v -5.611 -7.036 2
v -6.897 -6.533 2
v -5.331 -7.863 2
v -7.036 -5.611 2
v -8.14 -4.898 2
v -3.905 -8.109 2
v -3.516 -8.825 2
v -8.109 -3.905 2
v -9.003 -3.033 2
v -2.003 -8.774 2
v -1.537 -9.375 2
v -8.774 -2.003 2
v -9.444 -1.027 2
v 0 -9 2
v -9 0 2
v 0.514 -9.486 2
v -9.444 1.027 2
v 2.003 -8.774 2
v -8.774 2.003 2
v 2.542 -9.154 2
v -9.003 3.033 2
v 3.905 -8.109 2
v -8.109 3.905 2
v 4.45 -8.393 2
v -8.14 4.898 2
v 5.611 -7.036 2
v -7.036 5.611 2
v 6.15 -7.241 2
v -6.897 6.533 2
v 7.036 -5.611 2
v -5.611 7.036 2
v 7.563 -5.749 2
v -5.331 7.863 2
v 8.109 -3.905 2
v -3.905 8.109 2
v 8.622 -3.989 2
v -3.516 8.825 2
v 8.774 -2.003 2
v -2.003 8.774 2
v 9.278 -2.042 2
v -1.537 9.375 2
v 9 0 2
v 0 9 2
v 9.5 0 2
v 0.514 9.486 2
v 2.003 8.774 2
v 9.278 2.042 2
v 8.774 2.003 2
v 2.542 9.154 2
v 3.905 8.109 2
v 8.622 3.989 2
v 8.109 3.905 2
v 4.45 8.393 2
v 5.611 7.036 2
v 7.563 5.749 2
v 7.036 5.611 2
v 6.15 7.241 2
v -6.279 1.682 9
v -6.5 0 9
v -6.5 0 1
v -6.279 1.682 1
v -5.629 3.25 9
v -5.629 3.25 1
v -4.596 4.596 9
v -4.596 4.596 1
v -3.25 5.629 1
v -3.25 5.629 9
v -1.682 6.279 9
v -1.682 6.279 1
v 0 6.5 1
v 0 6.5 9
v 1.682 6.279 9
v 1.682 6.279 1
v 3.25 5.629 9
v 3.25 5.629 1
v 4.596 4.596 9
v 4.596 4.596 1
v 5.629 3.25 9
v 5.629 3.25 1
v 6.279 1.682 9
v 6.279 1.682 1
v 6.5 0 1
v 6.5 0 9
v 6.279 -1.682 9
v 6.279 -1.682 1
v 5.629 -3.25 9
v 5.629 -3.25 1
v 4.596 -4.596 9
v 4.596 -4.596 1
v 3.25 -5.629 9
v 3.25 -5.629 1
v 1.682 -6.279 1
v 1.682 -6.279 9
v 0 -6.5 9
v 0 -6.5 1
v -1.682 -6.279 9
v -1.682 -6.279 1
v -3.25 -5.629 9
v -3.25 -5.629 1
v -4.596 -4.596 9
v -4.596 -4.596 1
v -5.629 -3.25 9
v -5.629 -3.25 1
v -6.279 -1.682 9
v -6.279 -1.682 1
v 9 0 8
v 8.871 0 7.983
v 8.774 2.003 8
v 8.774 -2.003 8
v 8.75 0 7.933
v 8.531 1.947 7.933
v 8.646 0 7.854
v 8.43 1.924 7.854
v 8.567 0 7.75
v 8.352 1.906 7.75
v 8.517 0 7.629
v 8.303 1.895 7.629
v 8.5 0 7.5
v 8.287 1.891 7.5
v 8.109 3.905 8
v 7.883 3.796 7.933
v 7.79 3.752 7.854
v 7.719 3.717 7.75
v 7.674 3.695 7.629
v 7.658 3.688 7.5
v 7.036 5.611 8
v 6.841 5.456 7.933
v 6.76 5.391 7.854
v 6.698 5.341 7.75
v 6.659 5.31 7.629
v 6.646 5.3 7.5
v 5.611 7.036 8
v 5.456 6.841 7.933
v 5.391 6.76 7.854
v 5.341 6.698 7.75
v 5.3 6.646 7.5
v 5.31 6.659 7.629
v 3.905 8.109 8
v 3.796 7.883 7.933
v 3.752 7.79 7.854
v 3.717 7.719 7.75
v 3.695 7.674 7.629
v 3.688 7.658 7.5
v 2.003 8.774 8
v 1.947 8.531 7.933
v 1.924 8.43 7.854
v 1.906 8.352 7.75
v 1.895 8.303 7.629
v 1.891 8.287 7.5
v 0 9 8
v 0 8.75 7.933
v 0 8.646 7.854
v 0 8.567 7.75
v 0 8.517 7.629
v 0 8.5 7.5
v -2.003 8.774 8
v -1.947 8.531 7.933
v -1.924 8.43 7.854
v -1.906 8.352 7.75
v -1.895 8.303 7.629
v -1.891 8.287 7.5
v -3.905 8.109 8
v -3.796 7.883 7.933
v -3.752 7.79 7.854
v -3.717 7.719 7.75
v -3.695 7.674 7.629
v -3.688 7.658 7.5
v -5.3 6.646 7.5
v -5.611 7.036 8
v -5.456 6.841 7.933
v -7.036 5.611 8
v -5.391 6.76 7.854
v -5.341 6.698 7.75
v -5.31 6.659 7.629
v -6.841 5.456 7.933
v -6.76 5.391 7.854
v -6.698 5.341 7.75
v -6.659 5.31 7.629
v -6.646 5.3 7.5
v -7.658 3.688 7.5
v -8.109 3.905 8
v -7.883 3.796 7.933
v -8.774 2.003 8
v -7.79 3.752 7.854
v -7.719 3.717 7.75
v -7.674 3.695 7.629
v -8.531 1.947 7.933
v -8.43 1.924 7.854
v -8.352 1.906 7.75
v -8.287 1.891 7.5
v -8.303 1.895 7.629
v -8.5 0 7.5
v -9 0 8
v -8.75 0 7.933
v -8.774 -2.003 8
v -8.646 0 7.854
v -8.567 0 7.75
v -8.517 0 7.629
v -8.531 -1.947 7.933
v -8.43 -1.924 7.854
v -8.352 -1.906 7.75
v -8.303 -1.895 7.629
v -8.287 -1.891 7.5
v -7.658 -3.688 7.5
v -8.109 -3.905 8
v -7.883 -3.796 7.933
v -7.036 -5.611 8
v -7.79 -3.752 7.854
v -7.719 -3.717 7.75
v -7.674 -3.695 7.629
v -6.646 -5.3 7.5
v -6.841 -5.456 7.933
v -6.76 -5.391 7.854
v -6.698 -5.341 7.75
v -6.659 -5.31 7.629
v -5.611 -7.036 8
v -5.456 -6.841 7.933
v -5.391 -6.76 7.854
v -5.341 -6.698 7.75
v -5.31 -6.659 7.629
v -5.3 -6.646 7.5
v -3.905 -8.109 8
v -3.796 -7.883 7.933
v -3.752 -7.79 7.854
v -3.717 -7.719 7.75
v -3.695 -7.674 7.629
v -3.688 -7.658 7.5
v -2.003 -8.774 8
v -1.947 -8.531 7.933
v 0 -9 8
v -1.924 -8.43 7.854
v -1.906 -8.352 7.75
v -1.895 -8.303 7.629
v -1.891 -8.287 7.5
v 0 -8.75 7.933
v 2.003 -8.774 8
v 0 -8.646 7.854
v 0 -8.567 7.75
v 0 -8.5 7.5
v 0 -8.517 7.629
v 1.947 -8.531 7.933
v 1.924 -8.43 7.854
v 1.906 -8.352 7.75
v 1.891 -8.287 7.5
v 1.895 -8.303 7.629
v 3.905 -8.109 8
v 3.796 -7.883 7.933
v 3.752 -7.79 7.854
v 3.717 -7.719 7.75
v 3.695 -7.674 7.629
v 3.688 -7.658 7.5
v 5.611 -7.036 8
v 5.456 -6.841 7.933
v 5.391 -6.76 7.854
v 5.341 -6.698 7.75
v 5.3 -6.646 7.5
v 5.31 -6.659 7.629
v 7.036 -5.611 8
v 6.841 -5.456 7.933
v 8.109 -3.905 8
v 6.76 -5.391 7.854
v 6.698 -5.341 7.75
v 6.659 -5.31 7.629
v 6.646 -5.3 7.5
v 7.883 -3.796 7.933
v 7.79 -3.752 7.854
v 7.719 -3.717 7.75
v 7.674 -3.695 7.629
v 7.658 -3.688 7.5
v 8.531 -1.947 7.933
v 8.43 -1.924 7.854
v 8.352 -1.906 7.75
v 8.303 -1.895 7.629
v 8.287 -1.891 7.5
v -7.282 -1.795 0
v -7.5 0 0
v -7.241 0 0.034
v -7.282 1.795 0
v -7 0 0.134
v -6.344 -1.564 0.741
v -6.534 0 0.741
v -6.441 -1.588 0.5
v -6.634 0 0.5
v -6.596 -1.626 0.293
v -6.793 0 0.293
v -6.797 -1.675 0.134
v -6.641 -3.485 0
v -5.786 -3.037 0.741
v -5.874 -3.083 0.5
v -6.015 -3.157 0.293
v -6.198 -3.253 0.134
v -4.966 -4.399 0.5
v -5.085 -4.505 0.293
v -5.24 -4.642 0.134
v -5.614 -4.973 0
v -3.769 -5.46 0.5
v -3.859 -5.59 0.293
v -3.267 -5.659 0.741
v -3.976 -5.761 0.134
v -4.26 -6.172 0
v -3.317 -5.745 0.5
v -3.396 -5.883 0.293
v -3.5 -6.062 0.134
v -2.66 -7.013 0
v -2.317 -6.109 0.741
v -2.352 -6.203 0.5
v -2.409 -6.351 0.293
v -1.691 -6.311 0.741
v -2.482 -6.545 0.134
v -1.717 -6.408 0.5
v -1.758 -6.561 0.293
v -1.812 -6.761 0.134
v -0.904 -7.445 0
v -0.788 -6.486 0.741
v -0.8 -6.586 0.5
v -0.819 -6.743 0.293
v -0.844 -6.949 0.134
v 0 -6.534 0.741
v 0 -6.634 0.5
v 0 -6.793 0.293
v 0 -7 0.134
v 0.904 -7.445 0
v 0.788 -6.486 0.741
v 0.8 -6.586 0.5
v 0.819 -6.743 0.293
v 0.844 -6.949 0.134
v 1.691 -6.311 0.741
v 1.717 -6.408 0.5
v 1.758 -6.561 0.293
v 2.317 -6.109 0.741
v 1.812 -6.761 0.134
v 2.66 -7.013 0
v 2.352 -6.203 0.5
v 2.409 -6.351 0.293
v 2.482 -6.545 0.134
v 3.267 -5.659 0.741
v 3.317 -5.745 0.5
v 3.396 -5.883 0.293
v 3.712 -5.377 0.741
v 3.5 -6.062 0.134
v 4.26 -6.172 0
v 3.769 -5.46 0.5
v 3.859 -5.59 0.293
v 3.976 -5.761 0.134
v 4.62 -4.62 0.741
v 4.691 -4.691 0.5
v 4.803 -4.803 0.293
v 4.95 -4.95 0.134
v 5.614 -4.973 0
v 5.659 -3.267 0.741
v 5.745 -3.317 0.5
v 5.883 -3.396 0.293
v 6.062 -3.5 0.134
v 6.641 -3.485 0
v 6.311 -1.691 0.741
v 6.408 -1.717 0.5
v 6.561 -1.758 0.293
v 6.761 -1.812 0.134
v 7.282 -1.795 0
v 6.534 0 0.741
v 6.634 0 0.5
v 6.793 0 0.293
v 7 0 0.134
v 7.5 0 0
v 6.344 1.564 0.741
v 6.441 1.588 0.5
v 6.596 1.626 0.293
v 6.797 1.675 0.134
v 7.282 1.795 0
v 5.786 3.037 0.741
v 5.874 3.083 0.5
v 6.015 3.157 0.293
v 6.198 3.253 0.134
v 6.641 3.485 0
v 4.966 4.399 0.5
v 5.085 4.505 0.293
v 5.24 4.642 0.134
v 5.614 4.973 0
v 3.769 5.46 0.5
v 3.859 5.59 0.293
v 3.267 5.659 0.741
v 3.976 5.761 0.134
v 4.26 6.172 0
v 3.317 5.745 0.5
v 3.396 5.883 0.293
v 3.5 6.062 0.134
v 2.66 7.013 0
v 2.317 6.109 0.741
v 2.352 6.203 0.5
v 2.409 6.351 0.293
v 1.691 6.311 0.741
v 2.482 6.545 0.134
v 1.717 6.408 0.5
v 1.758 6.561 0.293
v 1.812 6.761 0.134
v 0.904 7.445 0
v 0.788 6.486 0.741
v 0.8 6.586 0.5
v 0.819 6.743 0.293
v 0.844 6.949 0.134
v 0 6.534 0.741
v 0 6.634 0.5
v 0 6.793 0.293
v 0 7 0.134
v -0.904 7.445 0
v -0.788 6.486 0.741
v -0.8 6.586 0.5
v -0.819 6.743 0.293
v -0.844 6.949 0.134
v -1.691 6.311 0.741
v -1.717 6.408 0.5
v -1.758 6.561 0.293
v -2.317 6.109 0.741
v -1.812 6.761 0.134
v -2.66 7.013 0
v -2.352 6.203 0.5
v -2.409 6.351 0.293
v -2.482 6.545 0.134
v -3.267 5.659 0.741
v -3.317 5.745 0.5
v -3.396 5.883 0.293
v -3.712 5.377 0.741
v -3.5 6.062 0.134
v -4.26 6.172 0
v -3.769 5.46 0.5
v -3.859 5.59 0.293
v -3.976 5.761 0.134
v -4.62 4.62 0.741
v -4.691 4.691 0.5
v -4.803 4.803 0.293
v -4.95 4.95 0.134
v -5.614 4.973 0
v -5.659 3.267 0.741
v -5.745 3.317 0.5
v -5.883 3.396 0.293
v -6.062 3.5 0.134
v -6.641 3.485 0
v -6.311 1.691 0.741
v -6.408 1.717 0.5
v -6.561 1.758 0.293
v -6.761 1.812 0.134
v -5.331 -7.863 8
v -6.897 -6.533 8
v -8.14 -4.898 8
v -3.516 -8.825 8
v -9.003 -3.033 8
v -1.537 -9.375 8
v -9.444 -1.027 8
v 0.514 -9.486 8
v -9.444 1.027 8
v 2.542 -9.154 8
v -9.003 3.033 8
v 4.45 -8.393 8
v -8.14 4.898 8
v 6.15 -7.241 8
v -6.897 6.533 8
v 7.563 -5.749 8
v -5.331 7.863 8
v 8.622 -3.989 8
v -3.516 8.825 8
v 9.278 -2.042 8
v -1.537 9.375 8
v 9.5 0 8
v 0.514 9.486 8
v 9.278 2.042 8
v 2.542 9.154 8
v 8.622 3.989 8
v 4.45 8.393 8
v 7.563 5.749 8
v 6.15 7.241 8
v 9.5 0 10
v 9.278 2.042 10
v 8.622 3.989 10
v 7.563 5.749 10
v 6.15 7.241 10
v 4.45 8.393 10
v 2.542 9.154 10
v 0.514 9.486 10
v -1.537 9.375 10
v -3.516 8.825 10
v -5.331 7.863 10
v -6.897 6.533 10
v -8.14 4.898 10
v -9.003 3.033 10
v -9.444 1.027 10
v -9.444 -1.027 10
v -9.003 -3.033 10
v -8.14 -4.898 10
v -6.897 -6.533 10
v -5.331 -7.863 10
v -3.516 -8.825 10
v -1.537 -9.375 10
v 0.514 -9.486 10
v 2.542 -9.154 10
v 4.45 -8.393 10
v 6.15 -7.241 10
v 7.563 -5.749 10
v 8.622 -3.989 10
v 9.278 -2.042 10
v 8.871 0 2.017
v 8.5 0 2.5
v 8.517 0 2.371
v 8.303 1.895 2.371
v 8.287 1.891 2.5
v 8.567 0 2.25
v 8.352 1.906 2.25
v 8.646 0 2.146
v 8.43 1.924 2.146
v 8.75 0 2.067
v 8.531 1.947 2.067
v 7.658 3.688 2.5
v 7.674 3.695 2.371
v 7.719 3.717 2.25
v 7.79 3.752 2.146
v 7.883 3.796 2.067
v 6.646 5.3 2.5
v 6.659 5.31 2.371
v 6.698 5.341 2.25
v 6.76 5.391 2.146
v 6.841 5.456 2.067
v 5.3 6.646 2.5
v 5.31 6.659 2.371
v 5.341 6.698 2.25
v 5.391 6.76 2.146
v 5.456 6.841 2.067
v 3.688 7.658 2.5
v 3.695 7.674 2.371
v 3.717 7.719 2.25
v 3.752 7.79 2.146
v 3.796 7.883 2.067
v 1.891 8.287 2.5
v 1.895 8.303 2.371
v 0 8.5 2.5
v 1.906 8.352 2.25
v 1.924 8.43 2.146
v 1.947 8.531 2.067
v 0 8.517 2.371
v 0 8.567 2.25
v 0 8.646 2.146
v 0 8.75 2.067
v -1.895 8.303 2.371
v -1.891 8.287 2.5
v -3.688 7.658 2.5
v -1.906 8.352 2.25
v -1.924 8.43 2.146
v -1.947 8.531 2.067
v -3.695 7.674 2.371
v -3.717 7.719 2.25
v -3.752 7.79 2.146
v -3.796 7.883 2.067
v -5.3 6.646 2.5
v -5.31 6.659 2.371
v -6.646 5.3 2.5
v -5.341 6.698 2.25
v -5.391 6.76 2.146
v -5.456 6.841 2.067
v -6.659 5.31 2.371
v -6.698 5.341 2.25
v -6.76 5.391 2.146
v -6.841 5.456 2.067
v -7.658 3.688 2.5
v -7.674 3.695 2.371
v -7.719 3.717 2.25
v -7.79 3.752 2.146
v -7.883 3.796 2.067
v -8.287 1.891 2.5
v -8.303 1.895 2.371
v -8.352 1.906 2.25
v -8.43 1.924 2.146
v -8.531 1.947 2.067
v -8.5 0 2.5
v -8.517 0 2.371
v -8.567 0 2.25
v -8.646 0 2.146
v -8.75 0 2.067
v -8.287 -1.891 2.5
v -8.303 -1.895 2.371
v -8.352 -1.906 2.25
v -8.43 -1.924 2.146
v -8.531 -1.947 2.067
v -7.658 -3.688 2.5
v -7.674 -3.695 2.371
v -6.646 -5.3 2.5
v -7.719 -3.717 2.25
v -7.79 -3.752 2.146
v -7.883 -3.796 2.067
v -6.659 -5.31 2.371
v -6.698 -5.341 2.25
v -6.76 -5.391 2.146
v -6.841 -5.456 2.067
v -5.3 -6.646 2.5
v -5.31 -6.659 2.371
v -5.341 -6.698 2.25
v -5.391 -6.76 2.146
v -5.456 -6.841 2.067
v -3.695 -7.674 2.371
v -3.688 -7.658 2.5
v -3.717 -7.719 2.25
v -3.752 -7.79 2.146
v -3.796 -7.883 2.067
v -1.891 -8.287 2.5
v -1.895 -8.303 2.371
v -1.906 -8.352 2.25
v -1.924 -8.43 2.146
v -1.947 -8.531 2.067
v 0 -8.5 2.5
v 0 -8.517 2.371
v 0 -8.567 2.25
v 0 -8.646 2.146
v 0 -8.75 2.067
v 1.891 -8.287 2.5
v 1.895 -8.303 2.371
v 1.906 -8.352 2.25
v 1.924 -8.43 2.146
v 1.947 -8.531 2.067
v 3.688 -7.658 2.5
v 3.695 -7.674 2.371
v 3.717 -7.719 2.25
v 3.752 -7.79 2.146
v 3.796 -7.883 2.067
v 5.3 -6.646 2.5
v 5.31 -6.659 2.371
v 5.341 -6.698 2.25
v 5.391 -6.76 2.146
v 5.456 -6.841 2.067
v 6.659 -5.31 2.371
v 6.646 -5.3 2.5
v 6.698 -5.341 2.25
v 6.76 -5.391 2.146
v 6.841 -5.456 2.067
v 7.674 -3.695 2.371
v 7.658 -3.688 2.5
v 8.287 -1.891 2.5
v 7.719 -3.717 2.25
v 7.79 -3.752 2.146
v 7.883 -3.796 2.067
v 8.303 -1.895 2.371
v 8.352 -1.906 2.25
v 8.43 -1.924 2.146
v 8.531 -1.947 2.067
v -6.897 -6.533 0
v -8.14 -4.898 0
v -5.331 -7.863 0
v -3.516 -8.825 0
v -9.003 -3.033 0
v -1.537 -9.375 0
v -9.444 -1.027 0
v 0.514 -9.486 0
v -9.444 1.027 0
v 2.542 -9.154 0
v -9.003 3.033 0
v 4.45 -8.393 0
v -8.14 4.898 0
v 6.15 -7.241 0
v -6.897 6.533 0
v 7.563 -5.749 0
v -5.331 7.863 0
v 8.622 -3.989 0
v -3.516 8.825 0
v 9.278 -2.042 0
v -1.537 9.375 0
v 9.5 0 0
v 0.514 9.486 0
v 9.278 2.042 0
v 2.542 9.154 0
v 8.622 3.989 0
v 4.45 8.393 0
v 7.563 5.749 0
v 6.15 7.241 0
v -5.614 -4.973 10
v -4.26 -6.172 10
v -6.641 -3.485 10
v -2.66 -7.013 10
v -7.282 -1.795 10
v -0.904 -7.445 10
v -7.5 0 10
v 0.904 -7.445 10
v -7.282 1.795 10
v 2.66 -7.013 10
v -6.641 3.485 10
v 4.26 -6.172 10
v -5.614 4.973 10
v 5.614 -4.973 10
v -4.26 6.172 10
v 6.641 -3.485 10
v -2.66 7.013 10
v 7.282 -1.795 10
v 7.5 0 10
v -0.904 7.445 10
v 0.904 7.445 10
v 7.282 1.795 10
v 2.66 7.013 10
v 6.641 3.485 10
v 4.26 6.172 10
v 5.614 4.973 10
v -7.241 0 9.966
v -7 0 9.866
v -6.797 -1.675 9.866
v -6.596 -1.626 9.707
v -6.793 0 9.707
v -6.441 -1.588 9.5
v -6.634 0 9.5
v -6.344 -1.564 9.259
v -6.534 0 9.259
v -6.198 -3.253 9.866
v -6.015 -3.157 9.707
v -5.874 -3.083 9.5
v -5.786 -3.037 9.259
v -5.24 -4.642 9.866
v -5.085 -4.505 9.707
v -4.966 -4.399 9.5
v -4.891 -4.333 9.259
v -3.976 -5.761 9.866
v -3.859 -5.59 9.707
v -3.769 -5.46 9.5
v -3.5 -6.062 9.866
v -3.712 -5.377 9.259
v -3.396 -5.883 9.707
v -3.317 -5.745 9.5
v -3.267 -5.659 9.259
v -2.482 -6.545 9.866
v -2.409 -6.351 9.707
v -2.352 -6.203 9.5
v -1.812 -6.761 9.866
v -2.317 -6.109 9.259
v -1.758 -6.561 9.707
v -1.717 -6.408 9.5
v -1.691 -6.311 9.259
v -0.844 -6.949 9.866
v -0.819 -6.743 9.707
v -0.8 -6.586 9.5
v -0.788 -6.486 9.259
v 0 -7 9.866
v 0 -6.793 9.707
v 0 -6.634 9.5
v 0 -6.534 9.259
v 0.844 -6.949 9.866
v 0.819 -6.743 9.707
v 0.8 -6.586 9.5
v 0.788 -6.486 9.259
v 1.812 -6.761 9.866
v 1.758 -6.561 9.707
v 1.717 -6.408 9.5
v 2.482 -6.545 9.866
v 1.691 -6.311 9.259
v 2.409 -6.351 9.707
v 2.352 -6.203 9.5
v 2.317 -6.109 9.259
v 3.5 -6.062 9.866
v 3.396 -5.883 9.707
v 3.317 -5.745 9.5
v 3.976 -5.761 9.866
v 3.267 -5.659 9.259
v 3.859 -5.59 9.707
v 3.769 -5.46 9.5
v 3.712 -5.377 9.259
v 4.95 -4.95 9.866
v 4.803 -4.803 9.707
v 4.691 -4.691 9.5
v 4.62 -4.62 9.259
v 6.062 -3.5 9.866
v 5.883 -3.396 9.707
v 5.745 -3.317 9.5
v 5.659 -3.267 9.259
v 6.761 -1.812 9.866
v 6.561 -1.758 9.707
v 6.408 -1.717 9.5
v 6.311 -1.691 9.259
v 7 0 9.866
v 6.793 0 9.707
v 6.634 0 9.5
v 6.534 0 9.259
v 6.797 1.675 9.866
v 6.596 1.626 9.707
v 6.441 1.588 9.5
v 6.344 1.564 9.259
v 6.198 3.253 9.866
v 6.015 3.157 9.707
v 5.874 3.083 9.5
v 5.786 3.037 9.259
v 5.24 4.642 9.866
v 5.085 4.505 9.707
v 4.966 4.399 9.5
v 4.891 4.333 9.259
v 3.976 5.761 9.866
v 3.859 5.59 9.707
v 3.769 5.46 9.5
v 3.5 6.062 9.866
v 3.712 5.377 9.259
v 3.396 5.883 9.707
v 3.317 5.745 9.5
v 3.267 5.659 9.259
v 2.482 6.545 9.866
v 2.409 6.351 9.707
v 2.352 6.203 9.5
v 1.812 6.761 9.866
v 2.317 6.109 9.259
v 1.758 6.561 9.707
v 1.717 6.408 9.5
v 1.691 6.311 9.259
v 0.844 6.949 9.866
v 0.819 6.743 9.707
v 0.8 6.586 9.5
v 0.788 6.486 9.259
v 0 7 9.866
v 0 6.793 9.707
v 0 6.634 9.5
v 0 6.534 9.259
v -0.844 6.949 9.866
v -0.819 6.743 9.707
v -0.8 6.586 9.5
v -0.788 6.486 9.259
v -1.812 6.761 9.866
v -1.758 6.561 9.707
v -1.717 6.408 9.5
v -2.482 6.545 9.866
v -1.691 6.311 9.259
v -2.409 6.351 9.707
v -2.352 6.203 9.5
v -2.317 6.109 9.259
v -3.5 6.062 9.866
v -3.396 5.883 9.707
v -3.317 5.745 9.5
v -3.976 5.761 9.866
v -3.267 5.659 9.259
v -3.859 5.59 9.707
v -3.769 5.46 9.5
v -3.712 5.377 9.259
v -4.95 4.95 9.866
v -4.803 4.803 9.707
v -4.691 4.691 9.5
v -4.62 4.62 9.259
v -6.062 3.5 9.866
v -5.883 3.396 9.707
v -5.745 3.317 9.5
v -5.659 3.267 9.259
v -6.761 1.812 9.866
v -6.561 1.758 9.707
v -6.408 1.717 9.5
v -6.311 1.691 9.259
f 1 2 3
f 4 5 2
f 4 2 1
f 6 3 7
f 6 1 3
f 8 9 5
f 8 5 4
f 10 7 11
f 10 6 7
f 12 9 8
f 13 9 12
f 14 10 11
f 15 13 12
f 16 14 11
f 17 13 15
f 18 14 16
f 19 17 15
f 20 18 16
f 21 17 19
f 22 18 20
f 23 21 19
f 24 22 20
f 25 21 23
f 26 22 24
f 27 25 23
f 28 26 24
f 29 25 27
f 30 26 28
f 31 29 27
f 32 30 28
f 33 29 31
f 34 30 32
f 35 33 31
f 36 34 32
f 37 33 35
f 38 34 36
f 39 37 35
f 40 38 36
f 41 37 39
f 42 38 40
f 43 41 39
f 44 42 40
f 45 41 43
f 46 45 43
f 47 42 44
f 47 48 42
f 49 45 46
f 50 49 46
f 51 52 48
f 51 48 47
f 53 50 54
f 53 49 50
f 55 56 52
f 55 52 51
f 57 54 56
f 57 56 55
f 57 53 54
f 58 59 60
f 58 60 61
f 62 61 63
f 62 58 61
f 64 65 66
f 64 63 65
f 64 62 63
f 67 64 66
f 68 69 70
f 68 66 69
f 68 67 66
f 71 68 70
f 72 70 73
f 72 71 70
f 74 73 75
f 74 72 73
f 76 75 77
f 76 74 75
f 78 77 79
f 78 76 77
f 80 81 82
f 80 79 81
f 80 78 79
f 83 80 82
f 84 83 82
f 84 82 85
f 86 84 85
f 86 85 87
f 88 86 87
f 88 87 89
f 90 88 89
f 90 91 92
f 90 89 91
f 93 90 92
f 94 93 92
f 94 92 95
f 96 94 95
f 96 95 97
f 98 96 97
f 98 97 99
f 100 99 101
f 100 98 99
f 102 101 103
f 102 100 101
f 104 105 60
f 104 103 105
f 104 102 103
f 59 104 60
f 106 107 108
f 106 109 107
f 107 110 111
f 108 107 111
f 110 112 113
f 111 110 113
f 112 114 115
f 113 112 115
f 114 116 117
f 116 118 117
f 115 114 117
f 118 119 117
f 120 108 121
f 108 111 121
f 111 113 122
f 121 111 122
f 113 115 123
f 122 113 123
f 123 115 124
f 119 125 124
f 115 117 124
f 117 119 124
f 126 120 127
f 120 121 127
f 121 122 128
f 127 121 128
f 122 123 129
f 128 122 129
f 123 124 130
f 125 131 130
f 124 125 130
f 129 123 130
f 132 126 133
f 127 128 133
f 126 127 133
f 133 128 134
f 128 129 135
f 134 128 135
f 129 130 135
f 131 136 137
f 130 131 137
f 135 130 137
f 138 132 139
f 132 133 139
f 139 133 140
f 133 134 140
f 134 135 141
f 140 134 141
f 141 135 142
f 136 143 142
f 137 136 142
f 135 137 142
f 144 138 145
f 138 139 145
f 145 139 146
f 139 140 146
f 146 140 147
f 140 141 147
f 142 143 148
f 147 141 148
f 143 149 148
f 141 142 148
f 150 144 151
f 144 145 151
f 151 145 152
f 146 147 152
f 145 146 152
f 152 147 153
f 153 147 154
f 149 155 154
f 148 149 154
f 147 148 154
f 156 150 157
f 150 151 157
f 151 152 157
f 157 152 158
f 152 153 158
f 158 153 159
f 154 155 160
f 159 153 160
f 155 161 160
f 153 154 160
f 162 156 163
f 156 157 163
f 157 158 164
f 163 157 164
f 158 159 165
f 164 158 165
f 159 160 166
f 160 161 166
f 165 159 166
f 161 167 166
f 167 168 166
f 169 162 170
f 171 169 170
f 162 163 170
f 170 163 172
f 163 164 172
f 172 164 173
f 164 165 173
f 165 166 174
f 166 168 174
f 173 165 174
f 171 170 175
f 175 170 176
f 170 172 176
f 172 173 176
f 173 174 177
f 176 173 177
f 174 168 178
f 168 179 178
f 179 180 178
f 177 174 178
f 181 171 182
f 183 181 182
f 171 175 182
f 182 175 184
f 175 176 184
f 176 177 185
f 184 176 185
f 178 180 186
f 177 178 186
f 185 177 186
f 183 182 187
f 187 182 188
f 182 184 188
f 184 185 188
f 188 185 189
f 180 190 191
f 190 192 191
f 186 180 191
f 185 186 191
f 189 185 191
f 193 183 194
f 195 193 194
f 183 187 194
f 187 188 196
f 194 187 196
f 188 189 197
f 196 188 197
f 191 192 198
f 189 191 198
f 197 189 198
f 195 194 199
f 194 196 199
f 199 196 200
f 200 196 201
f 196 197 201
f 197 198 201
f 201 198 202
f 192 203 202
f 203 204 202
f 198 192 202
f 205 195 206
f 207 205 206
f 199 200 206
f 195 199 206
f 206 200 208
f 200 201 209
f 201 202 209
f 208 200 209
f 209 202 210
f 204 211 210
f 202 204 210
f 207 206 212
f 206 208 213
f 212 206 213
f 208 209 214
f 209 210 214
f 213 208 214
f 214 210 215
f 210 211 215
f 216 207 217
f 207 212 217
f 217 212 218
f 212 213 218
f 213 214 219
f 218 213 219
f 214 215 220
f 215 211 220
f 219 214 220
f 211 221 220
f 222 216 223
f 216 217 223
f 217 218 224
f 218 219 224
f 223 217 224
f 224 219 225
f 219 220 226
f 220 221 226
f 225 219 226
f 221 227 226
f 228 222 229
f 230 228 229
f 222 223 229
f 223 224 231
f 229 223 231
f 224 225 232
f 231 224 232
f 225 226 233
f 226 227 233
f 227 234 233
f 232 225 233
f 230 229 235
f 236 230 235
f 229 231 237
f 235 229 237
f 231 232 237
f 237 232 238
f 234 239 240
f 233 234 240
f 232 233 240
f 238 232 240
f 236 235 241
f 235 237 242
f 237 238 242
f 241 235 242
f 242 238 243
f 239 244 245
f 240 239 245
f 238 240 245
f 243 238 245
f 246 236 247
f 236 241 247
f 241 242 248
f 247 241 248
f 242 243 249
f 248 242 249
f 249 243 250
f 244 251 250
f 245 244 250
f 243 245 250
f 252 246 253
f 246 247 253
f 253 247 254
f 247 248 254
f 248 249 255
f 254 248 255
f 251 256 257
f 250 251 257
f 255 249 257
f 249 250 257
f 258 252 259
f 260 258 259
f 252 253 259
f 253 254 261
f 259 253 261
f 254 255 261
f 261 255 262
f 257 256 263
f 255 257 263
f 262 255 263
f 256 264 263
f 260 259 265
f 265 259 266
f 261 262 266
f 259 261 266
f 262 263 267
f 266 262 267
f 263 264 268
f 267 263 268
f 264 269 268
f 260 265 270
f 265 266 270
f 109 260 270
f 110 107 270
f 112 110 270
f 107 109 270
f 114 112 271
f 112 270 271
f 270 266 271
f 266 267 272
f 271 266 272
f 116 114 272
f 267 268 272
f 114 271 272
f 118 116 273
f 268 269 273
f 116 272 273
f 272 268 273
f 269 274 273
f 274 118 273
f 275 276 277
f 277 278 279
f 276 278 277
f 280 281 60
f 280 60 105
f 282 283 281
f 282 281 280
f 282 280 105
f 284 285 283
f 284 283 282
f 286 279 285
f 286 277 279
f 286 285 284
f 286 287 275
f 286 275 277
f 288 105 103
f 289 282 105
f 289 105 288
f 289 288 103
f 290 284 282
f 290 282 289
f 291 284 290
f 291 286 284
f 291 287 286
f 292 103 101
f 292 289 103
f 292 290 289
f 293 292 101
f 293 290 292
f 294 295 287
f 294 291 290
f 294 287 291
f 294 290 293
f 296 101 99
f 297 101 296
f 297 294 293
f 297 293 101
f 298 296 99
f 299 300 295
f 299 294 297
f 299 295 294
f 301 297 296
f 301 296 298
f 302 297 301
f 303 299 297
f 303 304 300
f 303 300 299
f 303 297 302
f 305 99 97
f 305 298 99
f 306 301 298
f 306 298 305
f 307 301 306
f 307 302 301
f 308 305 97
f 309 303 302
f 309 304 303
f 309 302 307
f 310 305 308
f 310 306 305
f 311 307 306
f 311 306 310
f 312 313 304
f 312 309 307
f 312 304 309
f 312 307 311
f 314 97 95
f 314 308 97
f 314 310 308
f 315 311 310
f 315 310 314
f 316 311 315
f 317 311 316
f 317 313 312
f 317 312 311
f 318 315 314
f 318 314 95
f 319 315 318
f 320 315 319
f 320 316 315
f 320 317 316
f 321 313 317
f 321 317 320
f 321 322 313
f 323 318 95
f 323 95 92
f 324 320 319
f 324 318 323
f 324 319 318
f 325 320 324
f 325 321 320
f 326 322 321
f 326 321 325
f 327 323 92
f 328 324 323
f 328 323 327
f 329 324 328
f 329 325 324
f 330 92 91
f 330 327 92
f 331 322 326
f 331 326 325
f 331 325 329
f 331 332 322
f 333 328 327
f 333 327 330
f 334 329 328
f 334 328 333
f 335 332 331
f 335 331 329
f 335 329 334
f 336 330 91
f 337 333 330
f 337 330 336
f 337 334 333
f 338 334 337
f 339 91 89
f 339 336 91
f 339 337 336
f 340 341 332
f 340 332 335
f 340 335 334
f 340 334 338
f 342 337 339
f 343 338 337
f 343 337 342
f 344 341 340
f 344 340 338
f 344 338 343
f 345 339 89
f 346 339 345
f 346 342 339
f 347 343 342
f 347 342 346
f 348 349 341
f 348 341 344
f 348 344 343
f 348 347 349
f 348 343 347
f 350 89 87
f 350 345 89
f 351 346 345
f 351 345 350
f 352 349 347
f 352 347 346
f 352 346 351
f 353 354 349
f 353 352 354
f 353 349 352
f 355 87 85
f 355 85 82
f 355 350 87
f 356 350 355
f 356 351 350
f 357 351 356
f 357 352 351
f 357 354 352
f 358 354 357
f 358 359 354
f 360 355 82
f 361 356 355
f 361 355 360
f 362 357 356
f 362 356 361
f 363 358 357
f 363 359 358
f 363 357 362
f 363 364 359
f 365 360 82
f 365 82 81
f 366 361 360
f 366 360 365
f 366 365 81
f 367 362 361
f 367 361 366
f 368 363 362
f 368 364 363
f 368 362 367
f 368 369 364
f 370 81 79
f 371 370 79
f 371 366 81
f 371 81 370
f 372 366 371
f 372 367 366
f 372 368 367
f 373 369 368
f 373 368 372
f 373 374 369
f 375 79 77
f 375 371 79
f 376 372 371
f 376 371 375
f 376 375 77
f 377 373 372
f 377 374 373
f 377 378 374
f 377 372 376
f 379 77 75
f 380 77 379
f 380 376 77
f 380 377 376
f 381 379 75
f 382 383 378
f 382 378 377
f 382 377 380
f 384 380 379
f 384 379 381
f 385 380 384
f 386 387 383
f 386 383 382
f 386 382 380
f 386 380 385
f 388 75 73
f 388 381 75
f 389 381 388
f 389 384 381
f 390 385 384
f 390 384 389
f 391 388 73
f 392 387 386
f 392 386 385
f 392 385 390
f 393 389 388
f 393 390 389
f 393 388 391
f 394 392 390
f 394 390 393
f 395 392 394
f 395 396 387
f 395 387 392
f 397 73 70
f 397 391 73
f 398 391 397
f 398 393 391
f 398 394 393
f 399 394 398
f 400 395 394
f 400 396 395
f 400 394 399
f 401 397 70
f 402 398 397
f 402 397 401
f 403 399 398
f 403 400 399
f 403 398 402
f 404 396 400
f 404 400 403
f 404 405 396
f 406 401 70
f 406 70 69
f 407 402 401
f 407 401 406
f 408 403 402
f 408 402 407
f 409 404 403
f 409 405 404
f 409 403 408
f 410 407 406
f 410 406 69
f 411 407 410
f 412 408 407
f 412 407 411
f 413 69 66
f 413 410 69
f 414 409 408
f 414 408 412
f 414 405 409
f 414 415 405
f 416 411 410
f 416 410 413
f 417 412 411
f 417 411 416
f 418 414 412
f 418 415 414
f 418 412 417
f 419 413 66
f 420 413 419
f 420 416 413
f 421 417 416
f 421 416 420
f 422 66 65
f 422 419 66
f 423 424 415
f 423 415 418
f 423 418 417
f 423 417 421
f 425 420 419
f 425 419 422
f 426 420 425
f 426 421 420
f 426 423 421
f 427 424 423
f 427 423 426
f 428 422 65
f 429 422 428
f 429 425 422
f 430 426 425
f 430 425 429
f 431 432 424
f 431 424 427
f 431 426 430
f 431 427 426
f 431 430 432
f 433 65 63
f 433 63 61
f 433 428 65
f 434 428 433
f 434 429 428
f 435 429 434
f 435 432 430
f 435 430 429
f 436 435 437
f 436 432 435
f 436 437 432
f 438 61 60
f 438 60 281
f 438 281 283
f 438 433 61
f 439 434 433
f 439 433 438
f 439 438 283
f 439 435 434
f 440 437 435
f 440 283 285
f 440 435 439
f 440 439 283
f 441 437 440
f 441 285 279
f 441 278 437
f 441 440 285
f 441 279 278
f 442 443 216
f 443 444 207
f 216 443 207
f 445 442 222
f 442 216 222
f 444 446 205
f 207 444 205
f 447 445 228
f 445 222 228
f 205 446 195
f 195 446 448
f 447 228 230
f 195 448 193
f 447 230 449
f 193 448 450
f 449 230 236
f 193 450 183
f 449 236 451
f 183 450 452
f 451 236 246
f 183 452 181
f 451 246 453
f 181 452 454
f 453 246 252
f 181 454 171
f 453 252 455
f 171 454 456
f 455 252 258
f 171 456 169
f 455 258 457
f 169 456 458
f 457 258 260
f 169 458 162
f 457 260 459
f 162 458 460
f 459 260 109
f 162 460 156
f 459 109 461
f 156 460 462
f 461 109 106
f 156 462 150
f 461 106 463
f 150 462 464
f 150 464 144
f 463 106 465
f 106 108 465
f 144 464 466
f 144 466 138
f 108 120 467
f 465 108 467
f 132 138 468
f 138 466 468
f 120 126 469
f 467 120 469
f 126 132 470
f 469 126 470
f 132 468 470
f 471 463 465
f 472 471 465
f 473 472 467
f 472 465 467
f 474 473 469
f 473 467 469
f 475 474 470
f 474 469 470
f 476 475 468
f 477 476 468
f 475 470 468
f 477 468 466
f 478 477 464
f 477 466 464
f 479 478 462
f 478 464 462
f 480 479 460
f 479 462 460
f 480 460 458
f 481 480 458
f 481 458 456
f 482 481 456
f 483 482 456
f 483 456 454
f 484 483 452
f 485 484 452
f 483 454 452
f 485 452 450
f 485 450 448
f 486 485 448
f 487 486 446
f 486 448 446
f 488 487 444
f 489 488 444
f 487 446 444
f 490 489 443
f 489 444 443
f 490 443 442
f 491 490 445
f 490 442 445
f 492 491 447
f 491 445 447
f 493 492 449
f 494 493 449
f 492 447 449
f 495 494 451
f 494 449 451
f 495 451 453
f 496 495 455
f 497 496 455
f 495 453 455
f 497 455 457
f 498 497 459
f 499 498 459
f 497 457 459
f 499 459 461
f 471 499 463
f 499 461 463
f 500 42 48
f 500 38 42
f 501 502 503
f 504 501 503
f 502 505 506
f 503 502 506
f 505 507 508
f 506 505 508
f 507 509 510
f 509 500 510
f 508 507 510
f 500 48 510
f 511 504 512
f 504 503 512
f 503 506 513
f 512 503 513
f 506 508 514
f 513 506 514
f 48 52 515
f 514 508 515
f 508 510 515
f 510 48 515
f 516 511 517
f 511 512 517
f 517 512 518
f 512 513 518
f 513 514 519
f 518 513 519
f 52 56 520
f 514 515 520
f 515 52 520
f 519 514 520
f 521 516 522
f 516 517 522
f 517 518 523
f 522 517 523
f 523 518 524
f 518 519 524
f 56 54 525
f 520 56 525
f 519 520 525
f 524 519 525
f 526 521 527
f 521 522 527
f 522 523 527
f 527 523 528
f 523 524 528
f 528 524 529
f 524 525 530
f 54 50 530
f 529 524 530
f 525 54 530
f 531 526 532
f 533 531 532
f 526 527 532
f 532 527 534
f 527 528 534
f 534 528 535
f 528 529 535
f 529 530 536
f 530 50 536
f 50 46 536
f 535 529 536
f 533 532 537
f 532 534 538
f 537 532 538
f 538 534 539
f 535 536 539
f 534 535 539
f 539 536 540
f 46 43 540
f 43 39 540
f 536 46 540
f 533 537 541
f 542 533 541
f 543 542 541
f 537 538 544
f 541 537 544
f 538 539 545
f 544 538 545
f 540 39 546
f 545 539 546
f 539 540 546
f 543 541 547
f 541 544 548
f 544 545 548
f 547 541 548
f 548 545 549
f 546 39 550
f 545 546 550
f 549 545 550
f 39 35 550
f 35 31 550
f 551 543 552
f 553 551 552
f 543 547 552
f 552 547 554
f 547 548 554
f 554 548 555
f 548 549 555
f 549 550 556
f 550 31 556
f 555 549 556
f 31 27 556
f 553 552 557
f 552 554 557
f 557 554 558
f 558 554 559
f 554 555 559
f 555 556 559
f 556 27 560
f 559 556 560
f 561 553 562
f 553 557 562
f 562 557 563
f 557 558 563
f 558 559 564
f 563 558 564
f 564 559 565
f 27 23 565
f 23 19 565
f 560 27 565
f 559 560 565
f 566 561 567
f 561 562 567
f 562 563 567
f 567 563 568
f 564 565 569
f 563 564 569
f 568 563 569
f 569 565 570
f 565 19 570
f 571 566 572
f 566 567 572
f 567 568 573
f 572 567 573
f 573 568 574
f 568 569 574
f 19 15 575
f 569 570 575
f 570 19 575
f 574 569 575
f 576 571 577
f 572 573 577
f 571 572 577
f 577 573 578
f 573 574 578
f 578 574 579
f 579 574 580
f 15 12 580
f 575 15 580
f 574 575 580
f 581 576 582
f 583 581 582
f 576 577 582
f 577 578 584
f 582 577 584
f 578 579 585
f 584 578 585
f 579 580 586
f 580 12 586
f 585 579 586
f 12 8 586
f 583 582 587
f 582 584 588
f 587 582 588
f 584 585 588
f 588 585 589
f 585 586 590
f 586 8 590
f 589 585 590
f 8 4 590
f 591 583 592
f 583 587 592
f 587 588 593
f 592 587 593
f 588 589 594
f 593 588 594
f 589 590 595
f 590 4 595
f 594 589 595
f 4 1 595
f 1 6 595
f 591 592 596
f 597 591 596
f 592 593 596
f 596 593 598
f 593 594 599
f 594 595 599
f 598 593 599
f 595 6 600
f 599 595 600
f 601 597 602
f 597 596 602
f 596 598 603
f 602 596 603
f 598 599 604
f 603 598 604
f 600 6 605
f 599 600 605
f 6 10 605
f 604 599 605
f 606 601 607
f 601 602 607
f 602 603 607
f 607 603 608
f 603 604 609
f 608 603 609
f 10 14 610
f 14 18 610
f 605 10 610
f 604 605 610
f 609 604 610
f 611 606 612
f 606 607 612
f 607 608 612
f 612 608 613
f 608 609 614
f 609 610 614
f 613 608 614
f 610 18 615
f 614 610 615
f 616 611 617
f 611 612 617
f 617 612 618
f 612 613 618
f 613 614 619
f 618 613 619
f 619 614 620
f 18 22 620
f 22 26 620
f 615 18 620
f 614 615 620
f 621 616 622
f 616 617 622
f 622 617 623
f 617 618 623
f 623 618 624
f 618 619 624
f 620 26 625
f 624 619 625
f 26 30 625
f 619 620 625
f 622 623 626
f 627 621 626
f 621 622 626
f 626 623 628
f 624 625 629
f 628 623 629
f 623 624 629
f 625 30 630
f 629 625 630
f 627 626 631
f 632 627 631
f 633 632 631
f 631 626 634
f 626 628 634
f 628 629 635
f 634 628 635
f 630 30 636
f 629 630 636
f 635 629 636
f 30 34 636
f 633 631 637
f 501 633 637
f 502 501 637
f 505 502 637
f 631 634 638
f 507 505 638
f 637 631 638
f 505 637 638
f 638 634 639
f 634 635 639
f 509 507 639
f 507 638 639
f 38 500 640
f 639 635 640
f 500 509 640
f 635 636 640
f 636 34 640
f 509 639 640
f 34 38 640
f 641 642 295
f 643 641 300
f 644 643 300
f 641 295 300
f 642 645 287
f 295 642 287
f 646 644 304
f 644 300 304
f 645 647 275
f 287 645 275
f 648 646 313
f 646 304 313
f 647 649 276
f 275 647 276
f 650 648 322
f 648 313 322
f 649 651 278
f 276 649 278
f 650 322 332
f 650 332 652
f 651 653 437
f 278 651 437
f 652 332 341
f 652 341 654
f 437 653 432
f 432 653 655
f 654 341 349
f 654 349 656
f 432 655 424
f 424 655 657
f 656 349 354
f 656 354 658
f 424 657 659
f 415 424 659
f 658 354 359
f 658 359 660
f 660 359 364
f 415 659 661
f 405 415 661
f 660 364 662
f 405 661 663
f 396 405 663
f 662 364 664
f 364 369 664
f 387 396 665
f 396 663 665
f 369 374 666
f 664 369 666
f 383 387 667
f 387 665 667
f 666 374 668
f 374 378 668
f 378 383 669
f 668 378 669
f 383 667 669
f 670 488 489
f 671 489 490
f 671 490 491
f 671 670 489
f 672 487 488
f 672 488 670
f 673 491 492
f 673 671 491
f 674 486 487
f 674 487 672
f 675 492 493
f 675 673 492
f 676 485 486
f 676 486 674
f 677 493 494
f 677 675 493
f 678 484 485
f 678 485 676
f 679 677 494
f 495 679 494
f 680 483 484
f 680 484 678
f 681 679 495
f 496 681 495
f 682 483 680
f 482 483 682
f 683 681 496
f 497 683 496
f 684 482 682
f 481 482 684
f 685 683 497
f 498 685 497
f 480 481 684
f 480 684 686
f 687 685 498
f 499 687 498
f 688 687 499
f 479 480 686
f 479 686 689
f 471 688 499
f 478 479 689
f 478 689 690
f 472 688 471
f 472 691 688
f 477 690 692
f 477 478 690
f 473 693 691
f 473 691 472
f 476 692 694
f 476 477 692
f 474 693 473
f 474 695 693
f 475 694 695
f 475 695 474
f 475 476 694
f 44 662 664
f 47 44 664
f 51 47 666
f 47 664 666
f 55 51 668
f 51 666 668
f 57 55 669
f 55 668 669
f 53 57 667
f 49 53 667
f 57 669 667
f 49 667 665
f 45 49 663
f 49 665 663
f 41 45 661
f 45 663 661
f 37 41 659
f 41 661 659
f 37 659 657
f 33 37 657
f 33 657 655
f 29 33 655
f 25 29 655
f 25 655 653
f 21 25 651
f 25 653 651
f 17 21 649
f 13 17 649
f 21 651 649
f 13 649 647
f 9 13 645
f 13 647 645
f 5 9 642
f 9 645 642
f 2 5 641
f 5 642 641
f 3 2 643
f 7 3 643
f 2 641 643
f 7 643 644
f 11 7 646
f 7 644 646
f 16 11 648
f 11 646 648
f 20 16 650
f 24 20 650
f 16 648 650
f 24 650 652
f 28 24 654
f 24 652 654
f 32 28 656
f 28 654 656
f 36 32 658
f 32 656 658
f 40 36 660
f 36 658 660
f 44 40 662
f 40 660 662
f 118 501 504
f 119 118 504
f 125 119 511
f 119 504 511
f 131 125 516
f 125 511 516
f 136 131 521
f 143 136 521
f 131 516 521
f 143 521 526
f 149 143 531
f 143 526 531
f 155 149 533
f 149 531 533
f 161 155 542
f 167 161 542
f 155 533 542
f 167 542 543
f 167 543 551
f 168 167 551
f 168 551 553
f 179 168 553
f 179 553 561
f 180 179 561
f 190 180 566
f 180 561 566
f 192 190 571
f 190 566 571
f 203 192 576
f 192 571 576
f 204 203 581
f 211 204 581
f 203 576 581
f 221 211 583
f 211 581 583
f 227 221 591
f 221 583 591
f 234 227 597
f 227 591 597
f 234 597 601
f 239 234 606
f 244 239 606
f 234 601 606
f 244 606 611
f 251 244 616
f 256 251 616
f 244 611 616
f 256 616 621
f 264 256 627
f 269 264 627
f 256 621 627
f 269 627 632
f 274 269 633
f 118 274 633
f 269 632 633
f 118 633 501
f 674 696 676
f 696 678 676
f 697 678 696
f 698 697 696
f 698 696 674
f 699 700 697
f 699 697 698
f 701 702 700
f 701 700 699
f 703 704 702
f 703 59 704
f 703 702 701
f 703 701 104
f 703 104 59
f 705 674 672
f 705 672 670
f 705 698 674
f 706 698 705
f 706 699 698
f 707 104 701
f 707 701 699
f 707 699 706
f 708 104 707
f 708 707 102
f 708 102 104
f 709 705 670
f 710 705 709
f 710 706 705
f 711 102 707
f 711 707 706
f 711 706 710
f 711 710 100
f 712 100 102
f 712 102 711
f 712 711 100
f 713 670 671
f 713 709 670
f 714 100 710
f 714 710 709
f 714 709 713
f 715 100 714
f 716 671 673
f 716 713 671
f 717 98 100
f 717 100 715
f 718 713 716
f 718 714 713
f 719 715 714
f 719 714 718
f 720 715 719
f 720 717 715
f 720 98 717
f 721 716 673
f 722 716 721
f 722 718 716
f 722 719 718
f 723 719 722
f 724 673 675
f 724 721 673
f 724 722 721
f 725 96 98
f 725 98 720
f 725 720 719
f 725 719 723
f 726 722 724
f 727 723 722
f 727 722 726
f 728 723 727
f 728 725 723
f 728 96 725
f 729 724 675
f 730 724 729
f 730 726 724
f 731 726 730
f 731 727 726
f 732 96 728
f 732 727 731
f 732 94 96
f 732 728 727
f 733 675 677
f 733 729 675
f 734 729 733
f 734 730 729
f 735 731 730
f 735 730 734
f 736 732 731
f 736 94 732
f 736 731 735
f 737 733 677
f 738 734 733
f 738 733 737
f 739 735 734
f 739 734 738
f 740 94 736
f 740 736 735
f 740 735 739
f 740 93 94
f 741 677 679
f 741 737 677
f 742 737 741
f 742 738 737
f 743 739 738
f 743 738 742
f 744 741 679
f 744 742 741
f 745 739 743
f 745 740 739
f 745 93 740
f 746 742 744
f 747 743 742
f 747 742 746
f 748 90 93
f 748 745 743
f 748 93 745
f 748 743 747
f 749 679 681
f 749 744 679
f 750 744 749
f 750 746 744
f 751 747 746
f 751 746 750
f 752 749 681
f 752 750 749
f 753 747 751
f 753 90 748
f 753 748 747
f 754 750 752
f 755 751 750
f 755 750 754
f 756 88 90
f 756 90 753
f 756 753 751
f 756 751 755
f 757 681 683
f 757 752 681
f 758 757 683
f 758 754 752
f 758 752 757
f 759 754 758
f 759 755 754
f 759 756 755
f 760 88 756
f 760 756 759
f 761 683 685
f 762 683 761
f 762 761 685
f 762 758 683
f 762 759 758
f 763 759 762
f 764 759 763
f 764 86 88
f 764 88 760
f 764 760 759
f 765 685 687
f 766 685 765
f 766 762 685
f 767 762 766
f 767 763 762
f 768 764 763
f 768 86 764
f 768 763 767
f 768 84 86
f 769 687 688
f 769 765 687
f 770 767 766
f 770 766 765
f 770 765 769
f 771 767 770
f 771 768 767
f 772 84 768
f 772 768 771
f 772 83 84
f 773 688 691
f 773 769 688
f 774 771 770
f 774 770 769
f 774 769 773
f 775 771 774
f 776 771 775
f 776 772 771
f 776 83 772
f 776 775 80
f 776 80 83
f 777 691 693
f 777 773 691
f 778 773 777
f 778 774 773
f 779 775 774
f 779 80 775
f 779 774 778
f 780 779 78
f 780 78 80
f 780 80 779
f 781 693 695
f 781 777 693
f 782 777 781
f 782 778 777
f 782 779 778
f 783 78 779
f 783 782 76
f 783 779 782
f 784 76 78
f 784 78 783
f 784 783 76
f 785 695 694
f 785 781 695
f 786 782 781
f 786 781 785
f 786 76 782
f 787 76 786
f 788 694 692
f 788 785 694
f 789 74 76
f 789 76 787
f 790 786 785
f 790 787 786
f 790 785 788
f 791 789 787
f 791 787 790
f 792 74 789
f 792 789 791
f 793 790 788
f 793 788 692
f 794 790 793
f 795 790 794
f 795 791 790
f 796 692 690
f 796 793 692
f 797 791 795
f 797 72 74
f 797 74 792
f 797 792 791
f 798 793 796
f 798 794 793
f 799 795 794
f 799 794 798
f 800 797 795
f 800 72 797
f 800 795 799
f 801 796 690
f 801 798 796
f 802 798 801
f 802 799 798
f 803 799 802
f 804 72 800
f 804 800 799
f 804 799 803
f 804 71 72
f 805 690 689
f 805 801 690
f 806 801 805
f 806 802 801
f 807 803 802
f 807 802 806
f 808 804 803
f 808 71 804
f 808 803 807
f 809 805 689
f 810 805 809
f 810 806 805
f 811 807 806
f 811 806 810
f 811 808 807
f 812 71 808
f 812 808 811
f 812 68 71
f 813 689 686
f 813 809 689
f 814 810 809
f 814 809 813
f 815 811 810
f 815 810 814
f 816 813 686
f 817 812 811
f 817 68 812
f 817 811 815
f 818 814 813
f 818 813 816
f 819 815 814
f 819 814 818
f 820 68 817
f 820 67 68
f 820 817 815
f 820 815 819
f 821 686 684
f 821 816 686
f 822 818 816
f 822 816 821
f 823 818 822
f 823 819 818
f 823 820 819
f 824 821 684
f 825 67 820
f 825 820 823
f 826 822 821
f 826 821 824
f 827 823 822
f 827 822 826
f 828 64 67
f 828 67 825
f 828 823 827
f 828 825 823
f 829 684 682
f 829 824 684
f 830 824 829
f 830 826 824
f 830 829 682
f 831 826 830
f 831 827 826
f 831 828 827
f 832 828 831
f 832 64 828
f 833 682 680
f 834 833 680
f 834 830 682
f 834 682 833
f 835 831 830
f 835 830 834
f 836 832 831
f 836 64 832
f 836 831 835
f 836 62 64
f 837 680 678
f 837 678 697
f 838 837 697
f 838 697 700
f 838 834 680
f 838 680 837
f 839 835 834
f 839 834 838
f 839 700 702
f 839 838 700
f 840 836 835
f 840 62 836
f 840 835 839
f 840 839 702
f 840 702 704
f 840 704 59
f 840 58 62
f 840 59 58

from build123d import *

# Parameters (mm, degrees)
SKETCH1_R               = 9.5
BOSS_EXTRUDE1_DEPTH     = 2
SKETCH2_R               = 8.5
BOSS_EXTRUDE2_DEPTH     = 6
SKETCH3_R               = 9.5
BOSS_EXTRUDE3_DEPTH     = 2
CUT_EXTRUDE1_DEPTH      = 17.748134224
CUT_EXTRUDE1_DEPTH_BACK = 17.748134224
SKETCH4_R               = 6.5
FILLET1_R               = 1
FILLET2_R               = 0.5


with BuildPart() as part:
    # Sketch1 → Boss-Extrude1 (new body)
    with BuildSketch(Plane.XY):
        Circle(SKETCH1_R)
    extrude(amount=BOSS_EXTRUDE1_DEPTH)

    # Sketch2 → Boss-Extrude2 (add)
    with BuildSketch(Plane.XY.offset(2)):
        Circle(SKETCH2_R)
    extrude(amount=BOSS_EXTRUDE2_DEPTH)

    # Sketch3 → Boss-Extrude3 (add)
    with BuildSketch(Plane.XY.offset(8)):
        Circle(SKETCH3_R)
    extrude(amount=BOSS_EXTRUDE3_DEPTH)

    # Sketch4 → Cut-Extrude1 (cut, two sides: drawn at the far end of the back side and taken through both)
    with BuildSketch(Plane(origin=(0, 0, 0), x_dir=(-1, 0, 0), z_dir=(0, 0, -1)).offset(-CUT_EXTRUDE1_DEPTH_BACK)):
        Circle(SKETCH4_R)
    extrude(amount=CUT_EXTRUDE1_DEPTH + CUT_EXTRUDE1_DEPTH_BACK, mode=Mode.SUBTRACT)

    # Fillet1
    fillet1_edges = [part.edges().sort_by_distance(p)[0] for p in [
        (6.5, 0, 10),
        (6.5, 0, 0),
    ]]
    fillet(fillet1_edges, radius=FILLET1_R)

    # Fillet2
    fillet2_edges = [part.edges().sort_by_distance(p)[0] for p in [
        (-8.5, 0, 2),
        (-8.5, 0, 8),
    ]]
    fillet(fillet2_edges, radius=FILLET2_R)


solid = part.part
